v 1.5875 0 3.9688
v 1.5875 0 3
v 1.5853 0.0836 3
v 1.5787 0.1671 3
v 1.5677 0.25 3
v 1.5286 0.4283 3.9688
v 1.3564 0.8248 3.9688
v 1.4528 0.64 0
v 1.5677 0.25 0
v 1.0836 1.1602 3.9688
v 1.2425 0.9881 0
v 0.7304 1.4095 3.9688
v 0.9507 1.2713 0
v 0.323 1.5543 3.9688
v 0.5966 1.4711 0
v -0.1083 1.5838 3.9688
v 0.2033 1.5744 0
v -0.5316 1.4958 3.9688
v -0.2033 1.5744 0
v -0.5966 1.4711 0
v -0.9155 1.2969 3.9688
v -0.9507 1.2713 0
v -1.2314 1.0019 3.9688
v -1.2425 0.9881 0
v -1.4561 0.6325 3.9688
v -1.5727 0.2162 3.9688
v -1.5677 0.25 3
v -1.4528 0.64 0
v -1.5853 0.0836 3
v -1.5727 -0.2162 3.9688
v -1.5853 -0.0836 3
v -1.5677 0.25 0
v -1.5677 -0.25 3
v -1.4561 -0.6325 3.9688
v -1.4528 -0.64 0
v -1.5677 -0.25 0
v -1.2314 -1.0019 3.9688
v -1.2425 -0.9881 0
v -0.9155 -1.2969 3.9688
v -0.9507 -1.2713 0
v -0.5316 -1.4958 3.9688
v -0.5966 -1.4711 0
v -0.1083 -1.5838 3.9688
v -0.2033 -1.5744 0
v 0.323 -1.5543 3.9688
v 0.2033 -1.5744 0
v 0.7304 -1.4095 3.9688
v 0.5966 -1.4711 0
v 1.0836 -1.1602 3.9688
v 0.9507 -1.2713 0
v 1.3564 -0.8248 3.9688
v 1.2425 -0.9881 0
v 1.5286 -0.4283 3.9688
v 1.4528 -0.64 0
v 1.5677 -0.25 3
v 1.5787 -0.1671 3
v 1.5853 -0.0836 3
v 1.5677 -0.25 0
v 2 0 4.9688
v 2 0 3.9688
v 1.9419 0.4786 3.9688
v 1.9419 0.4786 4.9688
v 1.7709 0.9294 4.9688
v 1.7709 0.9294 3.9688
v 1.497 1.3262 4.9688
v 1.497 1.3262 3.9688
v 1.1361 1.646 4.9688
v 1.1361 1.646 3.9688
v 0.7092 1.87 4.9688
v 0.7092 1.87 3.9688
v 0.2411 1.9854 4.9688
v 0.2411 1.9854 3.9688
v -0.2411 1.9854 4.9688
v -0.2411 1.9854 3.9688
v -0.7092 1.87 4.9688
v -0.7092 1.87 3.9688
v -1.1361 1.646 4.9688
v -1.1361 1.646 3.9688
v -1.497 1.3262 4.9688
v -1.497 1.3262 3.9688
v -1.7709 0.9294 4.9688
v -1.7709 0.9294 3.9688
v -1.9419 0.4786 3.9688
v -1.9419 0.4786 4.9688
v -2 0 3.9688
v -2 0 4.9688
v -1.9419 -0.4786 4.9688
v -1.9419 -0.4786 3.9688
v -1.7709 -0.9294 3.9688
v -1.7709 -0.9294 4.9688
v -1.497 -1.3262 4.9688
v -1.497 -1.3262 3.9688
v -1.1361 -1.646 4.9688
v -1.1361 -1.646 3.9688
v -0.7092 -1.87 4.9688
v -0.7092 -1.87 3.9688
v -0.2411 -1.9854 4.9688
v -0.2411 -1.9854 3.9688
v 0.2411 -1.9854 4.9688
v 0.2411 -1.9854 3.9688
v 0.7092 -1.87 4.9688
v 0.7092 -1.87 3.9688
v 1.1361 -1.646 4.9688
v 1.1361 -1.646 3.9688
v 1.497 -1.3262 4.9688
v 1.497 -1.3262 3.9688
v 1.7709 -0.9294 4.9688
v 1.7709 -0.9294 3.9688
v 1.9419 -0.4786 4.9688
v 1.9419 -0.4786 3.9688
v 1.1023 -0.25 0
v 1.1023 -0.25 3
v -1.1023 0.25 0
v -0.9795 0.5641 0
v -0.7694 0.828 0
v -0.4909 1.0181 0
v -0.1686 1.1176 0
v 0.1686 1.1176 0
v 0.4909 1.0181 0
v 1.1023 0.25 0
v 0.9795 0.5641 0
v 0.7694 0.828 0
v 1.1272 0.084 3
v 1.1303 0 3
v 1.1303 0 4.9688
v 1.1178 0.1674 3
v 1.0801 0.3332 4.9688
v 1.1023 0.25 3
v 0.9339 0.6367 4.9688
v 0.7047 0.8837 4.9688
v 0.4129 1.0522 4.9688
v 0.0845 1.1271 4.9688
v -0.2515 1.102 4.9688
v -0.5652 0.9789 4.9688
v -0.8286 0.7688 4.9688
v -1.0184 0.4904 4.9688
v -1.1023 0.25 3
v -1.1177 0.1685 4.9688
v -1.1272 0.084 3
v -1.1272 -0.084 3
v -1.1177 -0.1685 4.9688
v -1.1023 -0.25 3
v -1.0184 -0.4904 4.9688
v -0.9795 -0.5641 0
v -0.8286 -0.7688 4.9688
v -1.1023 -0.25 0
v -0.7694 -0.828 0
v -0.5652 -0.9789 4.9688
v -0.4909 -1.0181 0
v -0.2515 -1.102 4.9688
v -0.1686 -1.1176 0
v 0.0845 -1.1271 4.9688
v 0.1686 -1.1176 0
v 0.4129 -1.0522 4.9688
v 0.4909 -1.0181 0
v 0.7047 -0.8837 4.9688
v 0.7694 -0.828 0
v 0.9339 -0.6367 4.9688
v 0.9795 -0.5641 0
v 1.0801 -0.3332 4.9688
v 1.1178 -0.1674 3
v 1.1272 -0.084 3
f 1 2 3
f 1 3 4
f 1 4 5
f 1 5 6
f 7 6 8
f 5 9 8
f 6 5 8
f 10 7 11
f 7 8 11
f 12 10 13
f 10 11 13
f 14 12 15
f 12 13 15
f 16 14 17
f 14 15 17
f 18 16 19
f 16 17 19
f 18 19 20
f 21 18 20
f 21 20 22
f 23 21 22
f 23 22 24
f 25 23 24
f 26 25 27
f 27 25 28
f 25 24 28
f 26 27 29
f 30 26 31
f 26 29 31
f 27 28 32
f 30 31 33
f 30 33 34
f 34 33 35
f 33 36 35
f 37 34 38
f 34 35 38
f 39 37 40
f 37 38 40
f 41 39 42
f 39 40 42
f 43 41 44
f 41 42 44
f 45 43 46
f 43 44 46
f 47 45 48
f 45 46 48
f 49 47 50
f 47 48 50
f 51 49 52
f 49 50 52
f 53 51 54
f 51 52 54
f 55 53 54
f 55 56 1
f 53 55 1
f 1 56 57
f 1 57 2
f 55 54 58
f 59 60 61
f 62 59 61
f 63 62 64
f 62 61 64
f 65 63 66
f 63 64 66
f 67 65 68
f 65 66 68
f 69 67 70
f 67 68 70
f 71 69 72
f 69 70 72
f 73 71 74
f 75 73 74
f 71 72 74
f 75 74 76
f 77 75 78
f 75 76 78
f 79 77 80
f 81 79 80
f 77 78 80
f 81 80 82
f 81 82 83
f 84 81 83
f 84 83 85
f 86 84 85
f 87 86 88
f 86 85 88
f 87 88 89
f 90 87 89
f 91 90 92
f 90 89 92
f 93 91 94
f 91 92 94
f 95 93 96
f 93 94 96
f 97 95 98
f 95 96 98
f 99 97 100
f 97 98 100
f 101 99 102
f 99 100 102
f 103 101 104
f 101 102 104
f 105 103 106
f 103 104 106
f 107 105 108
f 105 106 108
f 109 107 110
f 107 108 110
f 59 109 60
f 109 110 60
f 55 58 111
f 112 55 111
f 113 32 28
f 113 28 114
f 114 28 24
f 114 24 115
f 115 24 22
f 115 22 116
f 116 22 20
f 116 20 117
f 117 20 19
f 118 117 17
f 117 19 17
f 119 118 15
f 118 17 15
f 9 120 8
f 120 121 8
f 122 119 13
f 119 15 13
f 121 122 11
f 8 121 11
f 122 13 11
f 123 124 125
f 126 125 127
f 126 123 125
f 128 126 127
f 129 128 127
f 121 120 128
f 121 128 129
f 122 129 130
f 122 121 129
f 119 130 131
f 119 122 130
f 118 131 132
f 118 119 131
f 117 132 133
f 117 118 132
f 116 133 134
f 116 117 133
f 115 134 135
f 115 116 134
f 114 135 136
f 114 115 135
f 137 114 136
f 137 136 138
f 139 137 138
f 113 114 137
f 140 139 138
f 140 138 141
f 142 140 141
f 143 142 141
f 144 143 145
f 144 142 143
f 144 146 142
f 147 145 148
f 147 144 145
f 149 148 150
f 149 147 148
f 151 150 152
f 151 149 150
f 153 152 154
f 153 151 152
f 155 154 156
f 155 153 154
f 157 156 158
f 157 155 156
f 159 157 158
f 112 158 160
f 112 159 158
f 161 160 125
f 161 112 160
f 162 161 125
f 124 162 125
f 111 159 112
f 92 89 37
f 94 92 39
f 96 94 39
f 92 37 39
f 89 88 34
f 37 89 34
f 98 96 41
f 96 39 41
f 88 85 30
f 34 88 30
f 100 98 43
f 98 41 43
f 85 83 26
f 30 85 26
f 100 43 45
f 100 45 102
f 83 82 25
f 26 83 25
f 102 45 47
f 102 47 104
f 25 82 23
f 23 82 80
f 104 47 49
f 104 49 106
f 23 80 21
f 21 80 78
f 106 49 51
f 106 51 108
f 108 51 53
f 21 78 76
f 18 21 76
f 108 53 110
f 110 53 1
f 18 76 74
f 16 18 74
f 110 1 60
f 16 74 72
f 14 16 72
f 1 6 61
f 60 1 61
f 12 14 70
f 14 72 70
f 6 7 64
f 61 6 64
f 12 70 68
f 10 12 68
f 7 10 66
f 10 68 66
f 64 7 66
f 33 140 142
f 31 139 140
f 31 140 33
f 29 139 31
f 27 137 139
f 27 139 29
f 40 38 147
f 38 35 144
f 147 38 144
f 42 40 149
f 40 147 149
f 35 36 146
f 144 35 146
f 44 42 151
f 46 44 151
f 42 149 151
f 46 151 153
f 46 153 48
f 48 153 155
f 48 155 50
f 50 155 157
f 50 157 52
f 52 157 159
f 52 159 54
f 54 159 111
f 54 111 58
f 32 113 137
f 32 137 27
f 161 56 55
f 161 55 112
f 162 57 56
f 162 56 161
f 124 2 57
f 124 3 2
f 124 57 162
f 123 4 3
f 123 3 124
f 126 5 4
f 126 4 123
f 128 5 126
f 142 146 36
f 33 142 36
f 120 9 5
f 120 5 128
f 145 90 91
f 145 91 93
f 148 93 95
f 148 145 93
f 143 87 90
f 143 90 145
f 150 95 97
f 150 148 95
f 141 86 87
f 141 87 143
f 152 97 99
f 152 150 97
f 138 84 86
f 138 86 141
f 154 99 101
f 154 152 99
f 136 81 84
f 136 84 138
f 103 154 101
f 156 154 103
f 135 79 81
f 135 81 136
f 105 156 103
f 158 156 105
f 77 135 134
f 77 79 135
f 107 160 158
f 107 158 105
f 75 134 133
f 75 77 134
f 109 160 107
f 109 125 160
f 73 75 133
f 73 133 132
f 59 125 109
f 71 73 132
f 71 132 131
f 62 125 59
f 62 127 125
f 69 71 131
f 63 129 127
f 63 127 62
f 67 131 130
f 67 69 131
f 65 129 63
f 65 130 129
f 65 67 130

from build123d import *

# Parameters (mm, degrees)
SKETCH1_R           = 1.5875
SKETCH1_R_2         = 1.1303
BOSS_EXTRUDE1_DEPTH = 3.96875
SKETCH2_R           = 2
SKETCH2_R_2         = 1.5875
SKETCH2_R_3         = 1.1303
BOSS_EXTRUDE2_DEPTH = 1
SKETCH3_W           = 4.285117224
SKETCH3_H           = 0.5
CUT_EXTRUDE1_DEPTH  = 3


with BuildPart() as part:
    # Sketch1 → Boss-Extrude1 (new body)
    with BuildSketch(Plane.XY):
        Circle(SKETCH1_R)
        Circle(SKETCH1_R_2, mode=Mode.SUBTRACT)
    extrude(amount=BOSS_EXTRUDE1_DEPTH)

    # Sketch2 → Boss-Extrude2 (add)
    # profile 1 of 2: a face of its own
    with BuildSketch(Plane.XY.offset(3.96875)):
        Circle(SKETCH2_R)
        Circle(SKETCH2_R_2, mode=Mode.SUBTRACT)
    # profile 2 of 2: a face of its own
    with BuildSketch(Plane.XY.offset(3.96875)):
        Circle(SKETCH2_R_2)
        Circle(SKETCH2_R_3, mode=Mode.SUBTRACT)
    extrude(amount=BOSS_EXTRUDE2_DEPTH)

    # Sketch3 → Cut-Extrude1 (cut)
    with BuildSketch(Plane(origin=(0, 0, 0), x_dir=(-1, 0, 0), z_dir=(0, 0, -1))):
        Rectangle(SKETCH3_W, SKETCH3_H)
    extrude(amount=-CUT_EXTRUDE1_DEPTH, mode=Mode.SUBTRACT)


solid = part.part
